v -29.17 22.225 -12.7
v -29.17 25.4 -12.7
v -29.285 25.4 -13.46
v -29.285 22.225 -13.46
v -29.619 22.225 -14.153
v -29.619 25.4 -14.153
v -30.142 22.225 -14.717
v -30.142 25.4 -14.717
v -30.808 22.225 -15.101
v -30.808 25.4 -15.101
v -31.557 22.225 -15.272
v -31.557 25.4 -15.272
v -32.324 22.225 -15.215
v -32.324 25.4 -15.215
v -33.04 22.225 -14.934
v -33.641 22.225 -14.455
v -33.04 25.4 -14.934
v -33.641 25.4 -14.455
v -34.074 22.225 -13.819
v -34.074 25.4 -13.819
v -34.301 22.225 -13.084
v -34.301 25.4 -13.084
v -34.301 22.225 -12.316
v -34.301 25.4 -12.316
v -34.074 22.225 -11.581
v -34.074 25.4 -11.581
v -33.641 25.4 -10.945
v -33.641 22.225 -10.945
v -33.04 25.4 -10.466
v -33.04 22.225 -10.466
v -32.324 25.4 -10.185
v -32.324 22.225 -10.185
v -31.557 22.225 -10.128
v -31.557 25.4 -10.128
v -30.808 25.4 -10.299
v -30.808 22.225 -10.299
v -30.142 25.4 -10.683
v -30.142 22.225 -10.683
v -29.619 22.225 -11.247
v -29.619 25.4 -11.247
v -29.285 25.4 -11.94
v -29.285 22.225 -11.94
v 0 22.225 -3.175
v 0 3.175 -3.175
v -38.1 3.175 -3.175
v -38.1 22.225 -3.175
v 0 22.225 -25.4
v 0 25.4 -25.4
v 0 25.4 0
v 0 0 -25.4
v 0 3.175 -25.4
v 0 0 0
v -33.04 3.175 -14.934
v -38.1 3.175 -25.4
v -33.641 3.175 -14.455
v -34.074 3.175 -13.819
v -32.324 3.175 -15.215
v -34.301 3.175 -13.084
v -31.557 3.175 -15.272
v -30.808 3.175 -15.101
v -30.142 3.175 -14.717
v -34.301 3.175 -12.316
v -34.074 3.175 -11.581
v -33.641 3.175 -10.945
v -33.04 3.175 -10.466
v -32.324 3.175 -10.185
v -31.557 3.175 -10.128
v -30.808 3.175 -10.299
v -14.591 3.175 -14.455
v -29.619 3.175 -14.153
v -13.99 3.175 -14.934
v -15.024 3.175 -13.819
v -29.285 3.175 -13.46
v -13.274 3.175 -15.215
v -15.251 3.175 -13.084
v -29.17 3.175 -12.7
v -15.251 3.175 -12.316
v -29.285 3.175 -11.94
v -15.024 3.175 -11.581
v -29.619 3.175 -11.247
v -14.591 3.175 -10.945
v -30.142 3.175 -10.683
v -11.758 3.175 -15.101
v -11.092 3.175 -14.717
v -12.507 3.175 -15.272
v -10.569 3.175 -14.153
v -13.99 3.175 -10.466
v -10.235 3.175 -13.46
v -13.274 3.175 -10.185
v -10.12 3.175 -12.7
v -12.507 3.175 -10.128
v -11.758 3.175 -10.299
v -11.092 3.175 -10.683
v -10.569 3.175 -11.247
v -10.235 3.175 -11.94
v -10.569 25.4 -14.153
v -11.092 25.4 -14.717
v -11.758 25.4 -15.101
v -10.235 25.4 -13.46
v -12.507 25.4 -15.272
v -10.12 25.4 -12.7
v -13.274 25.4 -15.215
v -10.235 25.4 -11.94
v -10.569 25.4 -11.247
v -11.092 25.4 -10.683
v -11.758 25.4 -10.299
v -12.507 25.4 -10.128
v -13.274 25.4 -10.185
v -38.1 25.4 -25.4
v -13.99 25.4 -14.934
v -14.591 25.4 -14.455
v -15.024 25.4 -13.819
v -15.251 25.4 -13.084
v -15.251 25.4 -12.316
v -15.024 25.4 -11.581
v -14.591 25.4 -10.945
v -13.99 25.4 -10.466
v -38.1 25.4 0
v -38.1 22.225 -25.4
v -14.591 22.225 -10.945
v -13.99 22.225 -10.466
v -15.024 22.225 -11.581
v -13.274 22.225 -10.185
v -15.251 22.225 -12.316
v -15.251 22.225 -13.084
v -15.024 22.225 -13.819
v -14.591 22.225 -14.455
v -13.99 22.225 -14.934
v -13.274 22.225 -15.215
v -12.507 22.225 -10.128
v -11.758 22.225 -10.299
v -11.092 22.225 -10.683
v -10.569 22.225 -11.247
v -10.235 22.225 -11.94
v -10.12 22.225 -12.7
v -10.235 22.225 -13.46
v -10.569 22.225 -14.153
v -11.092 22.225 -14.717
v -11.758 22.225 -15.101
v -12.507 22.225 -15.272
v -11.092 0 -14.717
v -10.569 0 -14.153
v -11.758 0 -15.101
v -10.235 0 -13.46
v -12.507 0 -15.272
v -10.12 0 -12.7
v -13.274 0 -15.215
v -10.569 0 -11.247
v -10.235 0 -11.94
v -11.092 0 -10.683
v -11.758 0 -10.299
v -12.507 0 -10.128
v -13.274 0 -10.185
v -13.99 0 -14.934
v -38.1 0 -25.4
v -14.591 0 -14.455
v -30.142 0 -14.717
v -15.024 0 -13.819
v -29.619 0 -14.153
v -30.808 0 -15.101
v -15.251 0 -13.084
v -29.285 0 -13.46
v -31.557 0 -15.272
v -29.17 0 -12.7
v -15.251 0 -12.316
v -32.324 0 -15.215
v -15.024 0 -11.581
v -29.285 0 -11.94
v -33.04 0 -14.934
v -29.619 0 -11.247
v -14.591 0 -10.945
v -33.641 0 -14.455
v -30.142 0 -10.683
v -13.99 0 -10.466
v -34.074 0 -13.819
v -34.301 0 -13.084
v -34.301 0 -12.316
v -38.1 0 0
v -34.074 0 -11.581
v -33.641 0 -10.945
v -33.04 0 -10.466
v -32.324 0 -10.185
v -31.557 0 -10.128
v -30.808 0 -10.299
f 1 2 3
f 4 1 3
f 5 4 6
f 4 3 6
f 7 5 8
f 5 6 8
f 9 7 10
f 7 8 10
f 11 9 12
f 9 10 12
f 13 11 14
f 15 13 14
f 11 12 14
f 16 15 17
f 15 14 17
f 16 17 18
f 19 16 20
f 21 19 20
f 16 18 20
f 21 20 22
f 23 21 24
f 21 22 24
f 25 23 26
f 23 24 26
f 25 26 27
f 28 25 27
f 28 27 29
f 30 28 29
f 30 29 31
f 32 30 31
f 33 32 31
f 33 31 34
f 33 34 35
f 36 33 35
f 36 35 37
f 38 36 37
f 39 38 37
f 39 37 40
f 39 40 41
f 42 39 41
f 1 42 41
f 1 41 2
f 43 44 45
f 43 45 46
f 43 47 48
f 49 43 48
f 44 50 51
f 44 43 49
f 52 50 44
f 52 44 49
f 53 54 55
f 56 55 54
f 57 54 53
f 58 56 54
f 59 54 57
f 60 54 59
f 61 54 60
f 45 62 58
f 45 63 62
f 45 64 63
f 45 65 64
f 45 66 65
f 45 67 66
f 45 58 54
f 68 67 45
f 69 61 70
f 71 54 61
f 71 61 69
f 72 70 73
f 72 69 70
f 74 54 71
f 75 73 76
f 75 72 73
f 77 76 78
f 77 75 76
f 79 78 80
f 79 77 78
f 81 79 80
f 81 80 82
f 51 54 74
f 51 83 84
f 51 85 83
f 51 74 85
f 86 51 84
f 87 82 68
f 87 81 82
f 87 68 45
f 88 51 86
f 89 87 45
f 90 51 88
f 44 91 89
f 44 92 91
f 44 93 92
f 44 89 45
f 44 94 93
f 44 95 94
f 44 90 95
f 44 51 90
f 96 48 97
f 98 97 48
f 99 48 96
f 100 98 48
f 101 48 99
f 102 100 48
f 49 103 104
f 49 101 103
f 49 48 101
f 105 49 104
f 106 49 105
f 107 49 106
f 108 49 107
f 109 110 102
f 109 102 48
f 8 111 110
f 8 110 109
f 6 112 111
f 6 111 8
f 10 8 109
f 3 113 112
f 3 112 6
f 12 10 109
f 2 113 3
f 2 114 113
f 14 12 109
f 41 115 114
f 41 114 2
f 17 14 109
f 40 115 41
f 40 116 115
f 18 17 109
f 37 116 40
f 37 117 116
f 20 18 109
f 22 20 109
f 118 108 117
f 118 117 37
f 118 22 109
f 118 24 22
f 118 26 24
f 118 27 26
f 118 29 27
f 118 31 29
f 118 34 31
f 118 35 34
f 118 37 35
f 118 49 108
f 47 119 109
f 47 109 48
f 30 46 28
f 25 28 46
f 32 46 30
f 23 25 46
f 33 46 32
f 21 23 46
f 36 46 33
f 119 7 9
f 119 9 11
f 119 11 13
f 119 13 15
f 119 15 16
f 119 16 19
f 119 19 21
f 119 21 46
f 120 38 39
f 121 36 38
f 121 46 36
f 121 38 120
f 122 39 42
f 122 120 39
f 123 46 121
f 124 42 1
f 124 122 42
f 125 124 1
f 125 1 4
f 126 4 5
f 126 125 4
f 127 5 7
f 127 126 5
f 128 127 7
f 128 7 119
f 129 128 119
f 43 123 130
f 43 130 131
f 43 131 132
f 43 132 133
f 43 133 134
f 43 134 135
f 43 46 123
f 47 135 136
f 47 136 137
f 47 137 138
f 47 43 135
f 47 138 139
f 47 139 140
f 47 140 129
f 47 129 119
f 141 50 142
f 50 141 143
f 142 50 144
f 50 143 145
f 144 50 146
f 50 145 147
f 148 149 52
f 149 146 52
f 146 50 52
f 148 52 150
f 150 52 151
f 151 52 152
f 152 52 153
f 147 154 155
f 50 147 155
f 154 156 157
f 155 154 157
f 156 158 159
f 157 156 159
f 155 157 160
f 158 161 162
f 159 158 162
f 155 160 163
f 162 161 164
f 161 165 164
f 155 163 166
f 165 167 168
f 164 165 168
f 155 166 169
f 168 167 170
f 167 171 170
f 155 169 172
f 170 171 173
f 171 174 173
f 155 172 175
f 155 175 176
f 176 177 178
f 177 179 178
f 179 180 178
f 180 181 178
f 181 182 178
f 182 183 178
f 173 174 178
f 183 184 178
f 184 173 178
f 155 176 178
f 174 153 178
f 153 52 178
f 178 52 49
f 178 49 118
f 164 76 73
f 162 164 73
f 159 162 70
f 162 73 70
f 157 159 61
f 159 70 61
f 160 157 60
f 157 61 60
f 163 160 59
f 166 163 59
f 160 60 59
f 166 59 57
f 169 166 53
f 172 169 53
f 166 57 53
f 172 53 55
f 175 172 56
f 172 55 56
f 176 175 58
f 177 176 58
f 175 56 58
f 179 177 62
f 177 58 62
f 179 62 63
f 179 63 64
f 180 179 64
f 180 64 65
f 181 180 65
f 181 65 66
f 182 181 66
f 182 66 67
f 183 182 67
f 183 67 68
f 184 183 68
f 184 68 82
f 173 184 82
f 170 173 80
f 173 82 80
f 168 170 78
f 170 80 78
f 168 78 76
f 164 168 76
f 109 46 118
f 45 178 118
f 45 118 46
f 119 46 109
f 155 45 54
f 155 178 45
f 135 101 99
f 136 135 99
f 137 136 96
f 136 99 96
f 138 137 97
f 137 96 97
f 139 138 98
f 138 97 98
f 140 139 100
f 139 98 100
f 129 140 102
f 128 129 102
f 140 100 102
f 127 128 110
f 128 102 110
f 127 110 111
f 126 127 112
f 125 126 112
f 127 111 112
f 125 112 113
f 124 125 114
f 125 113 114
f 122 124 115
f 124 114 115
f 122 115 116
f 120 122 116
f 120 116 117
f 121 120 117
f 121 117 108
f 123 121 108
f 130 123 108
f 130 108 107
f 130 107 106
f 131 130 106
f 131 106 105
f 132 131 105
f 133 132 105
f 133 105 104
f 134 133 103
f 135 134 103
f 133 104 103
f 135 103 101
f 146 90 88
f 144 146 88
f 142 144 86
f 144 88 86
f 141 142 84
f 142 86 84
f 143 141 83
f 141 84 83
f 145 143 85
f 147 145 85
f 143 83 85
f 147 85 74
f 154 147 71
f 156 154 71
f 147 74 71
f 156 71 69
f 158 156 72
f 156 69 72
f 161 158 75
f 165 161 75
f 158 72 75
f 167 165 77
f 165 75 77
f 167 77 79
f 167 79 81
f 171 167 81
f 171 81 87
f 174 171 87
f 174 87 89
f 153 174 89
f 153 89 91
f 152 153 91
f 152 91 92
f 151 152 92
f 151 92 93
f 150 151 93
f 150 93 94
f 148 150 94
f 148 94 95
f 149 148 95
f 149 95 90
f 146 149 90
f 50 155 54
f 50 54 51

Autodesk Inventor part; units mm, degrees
ref_plane "YZ Plane" through (0, 0, 0) normal (1, 0, 0) x (0, 1, 0)
ref_plane "XZ Plane" through (0, 0, 0) normal (0, 1, 0) x (-1, 0, 0)
ref_plane "XY Plane" through (0, 0, 0) normal (0, 0, 1) x (1, 0, 0)
sketch "Sketch1" plane through (0, 0, 0) normal (0, 1, 0) x (-1, 0, 0)
  line L0 (0, 0) -> (38.1, 0)
  line L1 (38.1, -25.4) -> (0, -25.4)
  line L2 (0, -25.4) -> (0, 0)
  line L3 (38.1, 0) -> (38.1, -25.4)
extrude "Extrusion1" add sketch "Sketch1" along normal blind 25.4
sketch "Sketch2" plane through (0, 0, 0) normal (1, 0, 0) x (0, 0, -1)
  point P0 (0, 0)
sketch "Sketch3" plane through (0, 0, 0) normal (1, 0, 0) x (0, 0, -1)
  line L0 (25.4, 0) -> (0, 0) projected
  line L1 (25.4, 0) -> (25.4, 25.4) projected
  line L2 (0, 25.4) -> (25.4, 25.4) projected
  line L3 (0, 0) -> (0, 25.4) projected
  line L4 (22.225, 3.175) -> (3.175, 3.175)
  line L5 (3.175, 3.175) -> (3.175, 22.225)
  line L6 (3.175, 22.225) -> (22.225, 22.225)
  line L7 (22.225, 22.225) -> (25.4, 22.225)
  line L8 (25.4, 0) -> (25.4, 25.4) projected
  line L9 (22.225, 3.175) -> (25.4, 3.175)
  line L10 (25.4, 22.225) -> (25.4, 3.175)
  dimension "d4" = 3.175
sketch "Sketch4" plane through (0, 25.4, 0) normal (0, 1, 0) x (1, 0, 0)
  line L0 (-63.5, 0) -> (-63.5, 25.4) construction
  line L1 (-63.5, 12.7) -> (0, 12.7) construction
  line L2 (0, 12.7) -> (-12.7, 12.7) construction
  line L3 (-12.7, 12.7) -> (-31.75, 12.7) construction
  circle A0 centre (-31.75, 12.7) radius 2.5797
  circle A1 centre (-12.7, 12.7) radius 2.5797
  point P0 (0, 0)
  point P1 (-38.1, 0)
  point P2 (-38.1, 25.4)
  dimension "d7" = 12.7
  dimension "d8" = 19.05
  dimension "d9" = 5.1594
  dimension "d10" = 5.1594
extrude "Extrusion3" cut sketch "Sketch4" against normal blind 63.5
extrude "Extrusion4" cut sketch "Sketch3" against normal blind 127 contours L9 L4 L5 L6 L7 L1
properties part number "wheel tip connector 1"
